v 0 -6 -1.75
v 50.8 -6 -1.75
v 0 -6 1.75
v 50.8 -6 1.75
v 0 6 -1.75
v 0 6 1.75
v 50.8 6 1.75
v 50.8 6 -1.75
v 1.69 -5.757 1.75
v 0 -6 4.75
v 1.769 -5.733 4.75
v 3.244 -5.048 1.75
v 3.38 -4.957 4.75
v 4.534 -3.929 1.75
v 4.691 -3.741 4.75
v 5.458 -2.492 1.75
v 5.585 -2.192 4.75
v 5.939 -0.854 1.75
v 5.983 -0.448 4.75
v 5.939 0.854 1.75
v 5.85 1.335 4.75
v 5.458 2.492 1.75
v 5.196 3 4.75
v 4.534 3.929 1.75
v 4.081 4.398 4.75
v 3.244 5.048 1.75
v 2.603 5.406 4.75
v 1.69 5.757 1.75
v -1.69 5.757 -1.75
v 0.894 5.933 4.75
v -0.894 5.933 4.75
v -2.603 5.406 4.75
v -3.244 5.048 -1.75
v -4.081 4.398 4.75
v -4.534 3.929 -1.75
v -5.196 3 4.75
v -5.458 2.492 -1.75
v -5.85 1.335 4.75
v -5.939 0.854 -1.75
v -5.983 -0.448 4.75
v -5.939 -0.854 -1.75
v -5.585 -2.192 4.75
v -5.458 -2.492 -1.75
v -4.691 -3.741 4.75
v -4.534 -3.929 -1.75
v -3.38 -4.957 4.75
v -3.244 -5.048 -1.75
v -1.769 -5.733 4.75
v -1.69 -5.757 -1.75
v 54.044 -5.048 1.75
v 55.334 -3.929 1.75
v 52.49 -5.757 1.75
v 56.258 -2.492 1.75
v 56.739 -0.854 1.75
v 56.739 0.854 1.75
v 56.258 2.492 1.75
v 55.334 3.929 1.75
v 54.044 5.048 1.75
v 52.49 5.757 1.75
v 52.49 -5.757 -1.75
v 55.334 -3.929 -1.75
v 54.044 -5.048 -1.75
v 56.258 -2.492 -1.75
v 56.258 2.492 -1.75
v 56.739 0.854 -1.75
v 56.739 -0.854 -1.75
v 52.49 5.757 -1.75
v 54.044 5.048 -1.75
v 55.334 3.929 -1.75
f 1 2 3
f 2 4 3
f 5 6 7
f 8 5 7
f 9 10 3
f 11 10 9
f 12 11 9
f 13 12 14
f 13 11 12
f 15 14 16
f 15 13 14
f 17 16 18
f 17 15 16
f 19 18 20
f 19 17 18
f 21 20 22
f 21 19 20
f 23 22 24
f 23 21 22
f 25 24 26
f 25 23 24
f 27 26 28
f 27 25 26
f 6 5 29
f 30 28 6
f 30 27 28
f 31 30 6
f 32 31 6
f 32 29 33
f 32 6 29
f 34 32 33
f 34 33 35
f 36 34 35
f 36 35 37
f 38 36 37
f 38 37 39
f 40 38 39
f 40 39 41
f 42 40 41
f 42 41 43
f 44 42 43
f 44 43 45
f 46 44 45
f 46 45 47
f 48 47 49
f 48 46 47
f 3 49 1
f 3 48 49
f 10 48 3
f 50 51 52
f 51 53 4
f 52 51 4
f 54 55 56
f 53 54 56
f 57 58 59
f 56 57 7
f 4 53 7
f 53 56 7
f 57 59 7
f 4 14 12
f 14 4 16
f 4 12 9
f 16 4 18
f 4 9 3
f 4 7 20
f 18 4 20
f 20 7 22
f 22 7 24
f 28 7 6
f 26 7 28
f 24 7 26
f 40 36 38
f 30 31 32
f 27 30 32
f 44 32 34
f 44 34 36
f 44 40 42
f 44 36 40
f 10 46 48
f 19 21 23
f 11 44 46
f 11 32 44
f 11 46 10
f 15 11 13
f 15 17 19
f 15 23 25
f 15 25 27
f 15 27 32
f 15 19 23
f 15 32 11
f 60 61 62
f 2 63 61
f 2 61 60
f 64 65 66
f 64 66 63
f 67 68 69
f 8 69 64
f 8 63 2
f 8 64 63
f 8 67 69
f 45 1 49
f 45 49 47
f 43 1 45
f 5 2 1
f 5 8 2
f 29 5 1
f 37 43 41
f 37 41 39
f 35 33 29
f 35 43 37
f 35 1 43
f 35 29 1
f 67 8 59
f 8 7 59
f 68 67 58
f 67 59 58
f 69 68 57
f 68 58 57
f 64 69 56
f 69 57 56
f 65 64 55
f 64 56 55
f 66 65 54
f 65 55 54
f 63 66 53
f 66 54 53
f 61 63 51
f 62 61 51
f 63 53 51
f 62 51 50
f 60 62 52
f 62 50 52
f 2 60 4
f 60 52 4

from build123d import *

# Parameters (mm, degrees)
EXTRUDE_1_DEPTH = 1.75
EXTRUDE_START   = 3
SKETCH_2_R      = 6
EXTRUDE_2_DEPTH = 3


with BuildPart() as part:
    # 草图1 → 凸台-拉伸1 (new, symmetric)
    with BuildSketch(Plane.XY):
        with BuildLine():
            Line((0, 6), (50.8, 6))
            ThreePointArc((50.8, 6), (56.8, 0), (50.8, -6))
            Line((50.8, -6), (0, -6))
            ThreePointArc((0, -6), (-6, 0), (0, 6))
        make_face()
    extrude(amount=EXTRUDE_1_DEPTH, both=True)

    # 草图2 → 凸台-拉伸2 (add)
    with BuildSketch(Plane.XY.offset(1.75).offset(EXTRUDE_START)):
        with Locations(Location((0, 0, 0), (0, 0, 270))):
            Circle(SKETCH_2_R)
    extrude(amount=-EXTRUDE_2_DEPTH)


solid = part.part
